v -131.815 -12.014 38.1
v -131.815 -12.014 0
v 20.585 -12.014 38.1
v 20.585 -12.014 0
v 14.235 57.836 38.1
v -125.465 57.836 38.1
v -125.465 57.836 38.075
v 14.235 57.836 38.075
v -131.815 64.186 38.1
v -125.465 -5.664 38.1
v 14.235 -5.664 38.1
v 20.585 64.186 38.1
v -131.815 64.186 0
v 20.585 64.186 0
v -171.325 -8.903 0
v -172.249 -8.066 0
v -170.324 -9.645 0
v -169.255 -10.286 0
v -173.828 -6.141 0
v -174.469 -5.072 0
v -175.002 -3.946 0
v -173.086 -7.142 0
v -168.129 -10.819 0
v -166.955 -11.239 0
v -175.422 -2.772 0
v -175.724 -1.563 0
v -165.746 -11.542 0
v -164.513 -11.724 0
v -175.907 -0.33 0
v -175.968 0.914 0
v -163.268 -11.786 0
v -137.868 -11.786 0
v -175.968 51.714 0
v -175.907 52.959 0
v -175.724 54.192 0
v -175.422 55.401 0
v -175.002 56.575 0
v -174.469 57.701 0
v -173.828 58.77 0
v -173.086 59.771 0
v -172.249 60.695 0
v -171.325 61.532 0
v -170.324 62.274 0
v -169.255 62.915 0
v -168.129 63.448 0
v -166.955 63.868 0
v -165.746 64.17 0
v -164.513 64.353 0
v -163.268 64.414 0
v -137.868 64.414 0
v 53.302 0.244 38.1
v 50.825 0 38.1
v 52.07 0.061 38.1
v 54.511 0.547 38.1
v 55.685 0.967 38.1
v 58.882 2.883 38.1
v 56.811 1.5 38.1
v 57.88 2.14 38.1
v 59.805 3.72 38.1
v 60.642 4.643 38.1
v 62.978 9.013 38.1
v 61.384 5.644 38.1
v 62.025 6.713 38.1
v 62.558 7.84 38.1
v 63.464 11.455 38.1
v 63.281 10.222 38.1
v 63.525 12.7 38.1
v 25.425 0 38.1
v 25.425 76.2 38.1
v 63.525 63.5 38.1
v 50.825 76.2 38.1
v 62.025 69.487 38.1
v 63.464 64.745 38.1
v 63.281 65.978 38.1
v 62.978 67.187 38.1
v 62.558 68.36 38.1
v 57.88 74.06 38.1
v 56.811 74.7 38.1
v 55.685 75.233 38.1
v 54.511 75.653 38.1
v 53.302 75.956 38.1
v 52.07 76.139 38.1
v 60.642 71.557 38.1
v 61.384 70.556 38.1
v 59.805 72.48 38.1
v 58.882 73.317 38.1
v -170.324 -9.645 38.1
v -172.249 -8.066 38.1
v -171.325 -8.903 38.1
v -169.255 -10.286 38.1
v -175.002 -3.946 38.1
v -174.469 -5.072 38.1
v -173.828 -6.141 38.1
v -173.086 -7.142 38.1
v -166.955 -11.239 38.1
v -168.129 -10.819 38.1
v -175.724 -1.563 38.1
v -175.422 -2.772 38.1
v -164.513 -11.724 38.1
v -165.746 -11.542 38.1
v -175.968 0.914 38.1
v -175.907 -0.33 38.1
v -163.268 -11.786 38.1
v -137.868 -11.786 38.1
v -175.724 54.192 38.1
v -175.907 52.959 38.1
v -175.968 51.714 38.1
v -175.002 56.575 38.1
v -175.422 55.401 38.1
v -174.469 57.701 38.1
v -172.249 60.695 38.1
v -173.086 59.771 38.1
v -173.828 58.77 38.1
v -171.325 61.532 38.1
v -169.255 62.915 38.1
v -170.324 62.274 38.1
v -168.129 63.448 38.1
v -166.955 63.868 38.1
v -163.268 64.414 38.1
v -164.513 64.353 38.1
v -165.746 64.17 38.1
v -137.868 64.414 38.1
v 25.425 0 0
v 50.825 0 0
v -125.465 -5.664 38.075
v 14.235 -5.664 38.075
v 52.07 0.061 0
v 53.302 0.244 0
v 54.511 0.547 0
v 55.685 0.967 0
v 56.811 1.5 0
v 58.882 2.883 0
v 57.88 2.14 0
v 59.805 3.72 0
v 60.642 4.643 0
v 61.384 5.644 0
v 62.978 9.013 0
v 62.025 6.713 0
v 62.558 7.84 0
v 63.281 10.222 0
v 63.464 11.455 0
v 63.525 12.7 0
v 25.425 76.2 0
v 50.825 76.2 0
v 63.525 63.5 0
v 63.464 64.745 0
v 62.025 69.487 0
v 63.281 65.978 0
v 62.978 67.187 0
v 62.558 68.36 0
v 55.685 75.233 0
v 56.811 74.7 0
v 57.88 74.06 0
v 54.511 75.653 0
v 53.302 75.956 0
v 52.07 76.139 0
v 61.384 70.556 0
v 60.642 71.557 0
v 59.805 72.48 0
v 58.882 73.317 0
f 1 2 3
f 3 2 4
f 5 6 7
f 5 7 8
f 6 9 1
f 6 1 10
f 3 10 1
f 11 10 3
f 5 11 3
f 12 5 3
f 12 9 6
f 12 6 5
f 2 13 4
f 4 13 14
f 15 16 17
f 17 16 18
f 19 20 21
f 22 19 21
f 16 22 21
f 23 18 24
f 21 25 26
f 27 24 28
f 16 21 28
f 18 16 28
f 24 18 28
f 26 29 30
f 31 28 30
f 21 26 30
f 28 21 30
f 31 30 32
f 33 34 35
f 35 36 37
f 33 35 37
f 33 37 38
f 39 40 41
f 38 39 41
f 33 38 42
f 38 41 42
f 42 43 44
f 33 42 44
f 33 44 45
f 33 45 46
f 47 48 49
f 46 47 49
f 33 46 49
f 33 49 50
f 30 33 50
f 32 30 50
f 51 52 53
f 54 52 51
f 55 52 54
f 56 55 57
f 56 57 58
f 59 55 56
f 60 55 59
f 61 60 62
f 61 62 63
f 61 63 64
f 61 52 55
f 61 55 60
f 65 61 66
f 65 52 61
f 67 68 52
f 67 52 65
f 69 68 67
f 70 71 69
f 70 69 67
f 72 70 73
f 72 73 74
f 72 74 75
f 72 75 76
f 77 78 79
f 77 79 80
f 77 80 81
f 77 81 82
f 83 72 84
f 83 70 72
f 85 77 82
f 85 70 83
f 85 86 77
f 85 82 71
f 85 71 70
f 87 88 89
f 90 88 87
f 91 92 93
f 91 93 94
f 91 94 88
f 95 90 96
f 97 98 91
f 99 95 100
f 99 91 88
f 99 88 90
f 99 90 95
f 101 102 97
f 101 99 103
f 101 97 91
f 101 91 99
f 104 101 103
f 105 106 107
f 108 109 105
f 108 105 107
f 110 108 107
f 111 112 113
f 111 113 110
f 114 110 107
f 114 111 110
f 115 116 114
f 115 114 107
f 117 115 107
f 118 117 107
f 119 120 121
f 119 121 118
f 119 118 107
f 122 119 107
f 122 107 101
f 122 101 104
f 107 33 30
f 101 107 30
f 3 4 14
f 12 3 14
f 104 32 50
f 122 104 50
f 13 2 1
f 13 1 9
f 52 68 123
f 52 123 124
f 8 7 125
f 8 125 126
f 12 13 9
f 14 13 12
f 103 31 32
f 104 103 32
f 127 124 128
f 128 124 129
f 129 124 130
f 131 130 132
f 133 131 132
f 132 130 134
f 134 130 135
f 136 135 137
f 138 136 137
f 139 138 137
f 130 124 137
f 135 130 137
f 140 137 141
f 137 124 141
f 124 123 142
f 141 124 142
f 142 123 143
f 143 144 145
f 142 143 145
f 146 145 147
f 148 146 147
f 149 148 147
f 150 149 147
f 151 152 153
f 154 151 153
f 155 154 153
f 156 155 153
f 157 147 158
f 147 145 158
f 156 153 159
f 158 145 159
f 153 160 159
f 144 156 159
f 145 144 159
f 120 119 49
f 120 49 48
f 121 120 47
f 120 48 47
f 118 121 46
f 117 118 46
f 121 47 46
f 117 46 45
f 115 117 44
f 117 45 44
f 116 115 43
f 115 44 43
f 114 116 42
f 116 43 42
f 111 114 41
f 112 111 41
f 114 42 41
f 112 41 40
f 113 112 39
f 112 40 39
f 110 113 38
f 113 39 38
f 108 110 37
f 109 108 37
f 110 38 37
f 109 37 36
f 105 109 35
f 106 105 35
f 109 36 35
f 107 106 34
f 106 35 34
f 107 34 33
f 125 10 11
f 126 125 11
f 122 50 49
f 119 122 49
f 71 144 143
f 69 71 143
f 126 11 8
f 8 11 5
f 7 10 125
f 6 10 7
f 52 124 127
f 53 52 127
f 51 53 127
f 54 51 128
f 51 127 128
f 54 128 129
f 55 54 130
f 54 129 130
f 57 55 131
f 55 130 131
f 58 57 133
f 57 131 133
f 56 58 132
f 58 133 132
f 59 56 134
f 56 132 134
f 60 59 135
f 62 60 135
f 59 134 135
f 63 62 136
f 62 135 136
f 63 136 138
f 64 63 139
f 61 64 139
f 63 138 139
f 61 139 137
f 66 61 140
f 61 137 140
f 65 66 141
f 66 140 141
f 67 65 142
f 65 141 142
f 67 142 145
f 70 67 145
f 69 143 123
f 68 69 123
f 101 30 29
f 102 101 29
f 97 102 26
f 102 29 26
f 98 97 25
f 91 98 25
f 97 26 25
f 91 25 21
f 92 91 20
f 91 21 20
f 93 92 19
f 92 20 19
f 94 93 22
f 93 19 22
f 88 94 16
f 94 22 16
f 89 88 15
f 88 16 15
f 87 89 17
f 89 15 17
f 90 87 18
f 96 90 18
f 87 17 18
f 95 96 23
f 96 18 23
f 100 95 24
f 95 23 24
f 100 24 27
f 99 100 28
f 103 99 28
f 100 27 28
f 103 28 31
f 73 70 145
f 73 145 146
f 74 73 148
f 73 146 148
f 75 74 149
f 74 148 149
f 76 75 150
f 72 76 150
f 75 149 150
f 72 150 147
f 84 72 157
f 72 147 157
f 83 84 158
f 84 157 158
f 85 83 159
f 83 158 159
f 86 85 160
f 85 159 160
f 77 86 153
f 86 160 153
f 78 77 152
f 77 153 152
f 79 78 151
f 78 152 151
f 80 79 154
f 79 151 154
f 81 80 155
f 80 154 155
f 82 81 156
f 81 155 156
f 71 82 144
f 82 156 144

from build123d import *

# Parameters (mm, degrees)
F0_W     = 152.4
F0_H     = 76.2
F1_DEPTH = 38.1
F4_DEPTH = 38.1
F5_W     = 139.7
F5_H     = 63.5
F6_DEPTH = 0.0254


with BuildPart() as f1:
    # F0 (on Top) → F1 (new body)
    with BuildSketch(Plane.XY):
        with Locations((-55.615083, 26.086186)):
            Rectangle(F0_W, F0_H)
    extrude(amount=F1_DEPTH)

    # F5 (on face) → F6 (cut)
    with BuildSketch(Plane.XY.offset(38.1)):
        with Locations((-55.615083, 26.086186)):
            Rectangle(F5_W, F5_H)
    extrude(amount=-F6_DEPTH, mode=Mode.SUBTRACT)


with BuildPart() as f4:
    # F3 (on Top) + F2 (on Top) → F4 (new body)
    with BuildSketch(Plane.XY):
        with BuildLine():
            Line((-137.868449, 64.414455), (-163.268449, 64.414455))
            ThreePointArc((-163.268449, 64.414455), (-172.248705, 60.694711), (-175.968449, 51.714455))
            Line((-175.968449, 51.714455), (-175.968449, 0.914455))
            ThreePointArc((-175.968449, 0.914455), (-172.248705, -8.065802), (-163.268449, -11.785545))
            Line((-163.268449, -11.785545), (-137.868449, -11.785545))
            Line((-137.868449, -11.785545), (-137.868449, 64.414455))
        make_face()
    with BuildSketch(Plane.XY):
        with BuildLine():
            Line((50.824707, 76.2), (25.424707, 76.2))
            Line((25.424707, 76.2), (25.424707, 0))
            Line((25.424707, 0), (50.824707, 0))
            ThreePointArc((50.824707, 0), (59.804963, 3.719744), (63.524707, 12.7))
            Line((63.524707, 12.7), (63.524707, 63.5))
            ThreePointArc((63.524707, 63.5), (59.804963, 72.480256), (50.824707, 76.2))
        make_face()
    extrude(amount=F4_DEPTH)


solid = Compound([f1.part, f4.part])
